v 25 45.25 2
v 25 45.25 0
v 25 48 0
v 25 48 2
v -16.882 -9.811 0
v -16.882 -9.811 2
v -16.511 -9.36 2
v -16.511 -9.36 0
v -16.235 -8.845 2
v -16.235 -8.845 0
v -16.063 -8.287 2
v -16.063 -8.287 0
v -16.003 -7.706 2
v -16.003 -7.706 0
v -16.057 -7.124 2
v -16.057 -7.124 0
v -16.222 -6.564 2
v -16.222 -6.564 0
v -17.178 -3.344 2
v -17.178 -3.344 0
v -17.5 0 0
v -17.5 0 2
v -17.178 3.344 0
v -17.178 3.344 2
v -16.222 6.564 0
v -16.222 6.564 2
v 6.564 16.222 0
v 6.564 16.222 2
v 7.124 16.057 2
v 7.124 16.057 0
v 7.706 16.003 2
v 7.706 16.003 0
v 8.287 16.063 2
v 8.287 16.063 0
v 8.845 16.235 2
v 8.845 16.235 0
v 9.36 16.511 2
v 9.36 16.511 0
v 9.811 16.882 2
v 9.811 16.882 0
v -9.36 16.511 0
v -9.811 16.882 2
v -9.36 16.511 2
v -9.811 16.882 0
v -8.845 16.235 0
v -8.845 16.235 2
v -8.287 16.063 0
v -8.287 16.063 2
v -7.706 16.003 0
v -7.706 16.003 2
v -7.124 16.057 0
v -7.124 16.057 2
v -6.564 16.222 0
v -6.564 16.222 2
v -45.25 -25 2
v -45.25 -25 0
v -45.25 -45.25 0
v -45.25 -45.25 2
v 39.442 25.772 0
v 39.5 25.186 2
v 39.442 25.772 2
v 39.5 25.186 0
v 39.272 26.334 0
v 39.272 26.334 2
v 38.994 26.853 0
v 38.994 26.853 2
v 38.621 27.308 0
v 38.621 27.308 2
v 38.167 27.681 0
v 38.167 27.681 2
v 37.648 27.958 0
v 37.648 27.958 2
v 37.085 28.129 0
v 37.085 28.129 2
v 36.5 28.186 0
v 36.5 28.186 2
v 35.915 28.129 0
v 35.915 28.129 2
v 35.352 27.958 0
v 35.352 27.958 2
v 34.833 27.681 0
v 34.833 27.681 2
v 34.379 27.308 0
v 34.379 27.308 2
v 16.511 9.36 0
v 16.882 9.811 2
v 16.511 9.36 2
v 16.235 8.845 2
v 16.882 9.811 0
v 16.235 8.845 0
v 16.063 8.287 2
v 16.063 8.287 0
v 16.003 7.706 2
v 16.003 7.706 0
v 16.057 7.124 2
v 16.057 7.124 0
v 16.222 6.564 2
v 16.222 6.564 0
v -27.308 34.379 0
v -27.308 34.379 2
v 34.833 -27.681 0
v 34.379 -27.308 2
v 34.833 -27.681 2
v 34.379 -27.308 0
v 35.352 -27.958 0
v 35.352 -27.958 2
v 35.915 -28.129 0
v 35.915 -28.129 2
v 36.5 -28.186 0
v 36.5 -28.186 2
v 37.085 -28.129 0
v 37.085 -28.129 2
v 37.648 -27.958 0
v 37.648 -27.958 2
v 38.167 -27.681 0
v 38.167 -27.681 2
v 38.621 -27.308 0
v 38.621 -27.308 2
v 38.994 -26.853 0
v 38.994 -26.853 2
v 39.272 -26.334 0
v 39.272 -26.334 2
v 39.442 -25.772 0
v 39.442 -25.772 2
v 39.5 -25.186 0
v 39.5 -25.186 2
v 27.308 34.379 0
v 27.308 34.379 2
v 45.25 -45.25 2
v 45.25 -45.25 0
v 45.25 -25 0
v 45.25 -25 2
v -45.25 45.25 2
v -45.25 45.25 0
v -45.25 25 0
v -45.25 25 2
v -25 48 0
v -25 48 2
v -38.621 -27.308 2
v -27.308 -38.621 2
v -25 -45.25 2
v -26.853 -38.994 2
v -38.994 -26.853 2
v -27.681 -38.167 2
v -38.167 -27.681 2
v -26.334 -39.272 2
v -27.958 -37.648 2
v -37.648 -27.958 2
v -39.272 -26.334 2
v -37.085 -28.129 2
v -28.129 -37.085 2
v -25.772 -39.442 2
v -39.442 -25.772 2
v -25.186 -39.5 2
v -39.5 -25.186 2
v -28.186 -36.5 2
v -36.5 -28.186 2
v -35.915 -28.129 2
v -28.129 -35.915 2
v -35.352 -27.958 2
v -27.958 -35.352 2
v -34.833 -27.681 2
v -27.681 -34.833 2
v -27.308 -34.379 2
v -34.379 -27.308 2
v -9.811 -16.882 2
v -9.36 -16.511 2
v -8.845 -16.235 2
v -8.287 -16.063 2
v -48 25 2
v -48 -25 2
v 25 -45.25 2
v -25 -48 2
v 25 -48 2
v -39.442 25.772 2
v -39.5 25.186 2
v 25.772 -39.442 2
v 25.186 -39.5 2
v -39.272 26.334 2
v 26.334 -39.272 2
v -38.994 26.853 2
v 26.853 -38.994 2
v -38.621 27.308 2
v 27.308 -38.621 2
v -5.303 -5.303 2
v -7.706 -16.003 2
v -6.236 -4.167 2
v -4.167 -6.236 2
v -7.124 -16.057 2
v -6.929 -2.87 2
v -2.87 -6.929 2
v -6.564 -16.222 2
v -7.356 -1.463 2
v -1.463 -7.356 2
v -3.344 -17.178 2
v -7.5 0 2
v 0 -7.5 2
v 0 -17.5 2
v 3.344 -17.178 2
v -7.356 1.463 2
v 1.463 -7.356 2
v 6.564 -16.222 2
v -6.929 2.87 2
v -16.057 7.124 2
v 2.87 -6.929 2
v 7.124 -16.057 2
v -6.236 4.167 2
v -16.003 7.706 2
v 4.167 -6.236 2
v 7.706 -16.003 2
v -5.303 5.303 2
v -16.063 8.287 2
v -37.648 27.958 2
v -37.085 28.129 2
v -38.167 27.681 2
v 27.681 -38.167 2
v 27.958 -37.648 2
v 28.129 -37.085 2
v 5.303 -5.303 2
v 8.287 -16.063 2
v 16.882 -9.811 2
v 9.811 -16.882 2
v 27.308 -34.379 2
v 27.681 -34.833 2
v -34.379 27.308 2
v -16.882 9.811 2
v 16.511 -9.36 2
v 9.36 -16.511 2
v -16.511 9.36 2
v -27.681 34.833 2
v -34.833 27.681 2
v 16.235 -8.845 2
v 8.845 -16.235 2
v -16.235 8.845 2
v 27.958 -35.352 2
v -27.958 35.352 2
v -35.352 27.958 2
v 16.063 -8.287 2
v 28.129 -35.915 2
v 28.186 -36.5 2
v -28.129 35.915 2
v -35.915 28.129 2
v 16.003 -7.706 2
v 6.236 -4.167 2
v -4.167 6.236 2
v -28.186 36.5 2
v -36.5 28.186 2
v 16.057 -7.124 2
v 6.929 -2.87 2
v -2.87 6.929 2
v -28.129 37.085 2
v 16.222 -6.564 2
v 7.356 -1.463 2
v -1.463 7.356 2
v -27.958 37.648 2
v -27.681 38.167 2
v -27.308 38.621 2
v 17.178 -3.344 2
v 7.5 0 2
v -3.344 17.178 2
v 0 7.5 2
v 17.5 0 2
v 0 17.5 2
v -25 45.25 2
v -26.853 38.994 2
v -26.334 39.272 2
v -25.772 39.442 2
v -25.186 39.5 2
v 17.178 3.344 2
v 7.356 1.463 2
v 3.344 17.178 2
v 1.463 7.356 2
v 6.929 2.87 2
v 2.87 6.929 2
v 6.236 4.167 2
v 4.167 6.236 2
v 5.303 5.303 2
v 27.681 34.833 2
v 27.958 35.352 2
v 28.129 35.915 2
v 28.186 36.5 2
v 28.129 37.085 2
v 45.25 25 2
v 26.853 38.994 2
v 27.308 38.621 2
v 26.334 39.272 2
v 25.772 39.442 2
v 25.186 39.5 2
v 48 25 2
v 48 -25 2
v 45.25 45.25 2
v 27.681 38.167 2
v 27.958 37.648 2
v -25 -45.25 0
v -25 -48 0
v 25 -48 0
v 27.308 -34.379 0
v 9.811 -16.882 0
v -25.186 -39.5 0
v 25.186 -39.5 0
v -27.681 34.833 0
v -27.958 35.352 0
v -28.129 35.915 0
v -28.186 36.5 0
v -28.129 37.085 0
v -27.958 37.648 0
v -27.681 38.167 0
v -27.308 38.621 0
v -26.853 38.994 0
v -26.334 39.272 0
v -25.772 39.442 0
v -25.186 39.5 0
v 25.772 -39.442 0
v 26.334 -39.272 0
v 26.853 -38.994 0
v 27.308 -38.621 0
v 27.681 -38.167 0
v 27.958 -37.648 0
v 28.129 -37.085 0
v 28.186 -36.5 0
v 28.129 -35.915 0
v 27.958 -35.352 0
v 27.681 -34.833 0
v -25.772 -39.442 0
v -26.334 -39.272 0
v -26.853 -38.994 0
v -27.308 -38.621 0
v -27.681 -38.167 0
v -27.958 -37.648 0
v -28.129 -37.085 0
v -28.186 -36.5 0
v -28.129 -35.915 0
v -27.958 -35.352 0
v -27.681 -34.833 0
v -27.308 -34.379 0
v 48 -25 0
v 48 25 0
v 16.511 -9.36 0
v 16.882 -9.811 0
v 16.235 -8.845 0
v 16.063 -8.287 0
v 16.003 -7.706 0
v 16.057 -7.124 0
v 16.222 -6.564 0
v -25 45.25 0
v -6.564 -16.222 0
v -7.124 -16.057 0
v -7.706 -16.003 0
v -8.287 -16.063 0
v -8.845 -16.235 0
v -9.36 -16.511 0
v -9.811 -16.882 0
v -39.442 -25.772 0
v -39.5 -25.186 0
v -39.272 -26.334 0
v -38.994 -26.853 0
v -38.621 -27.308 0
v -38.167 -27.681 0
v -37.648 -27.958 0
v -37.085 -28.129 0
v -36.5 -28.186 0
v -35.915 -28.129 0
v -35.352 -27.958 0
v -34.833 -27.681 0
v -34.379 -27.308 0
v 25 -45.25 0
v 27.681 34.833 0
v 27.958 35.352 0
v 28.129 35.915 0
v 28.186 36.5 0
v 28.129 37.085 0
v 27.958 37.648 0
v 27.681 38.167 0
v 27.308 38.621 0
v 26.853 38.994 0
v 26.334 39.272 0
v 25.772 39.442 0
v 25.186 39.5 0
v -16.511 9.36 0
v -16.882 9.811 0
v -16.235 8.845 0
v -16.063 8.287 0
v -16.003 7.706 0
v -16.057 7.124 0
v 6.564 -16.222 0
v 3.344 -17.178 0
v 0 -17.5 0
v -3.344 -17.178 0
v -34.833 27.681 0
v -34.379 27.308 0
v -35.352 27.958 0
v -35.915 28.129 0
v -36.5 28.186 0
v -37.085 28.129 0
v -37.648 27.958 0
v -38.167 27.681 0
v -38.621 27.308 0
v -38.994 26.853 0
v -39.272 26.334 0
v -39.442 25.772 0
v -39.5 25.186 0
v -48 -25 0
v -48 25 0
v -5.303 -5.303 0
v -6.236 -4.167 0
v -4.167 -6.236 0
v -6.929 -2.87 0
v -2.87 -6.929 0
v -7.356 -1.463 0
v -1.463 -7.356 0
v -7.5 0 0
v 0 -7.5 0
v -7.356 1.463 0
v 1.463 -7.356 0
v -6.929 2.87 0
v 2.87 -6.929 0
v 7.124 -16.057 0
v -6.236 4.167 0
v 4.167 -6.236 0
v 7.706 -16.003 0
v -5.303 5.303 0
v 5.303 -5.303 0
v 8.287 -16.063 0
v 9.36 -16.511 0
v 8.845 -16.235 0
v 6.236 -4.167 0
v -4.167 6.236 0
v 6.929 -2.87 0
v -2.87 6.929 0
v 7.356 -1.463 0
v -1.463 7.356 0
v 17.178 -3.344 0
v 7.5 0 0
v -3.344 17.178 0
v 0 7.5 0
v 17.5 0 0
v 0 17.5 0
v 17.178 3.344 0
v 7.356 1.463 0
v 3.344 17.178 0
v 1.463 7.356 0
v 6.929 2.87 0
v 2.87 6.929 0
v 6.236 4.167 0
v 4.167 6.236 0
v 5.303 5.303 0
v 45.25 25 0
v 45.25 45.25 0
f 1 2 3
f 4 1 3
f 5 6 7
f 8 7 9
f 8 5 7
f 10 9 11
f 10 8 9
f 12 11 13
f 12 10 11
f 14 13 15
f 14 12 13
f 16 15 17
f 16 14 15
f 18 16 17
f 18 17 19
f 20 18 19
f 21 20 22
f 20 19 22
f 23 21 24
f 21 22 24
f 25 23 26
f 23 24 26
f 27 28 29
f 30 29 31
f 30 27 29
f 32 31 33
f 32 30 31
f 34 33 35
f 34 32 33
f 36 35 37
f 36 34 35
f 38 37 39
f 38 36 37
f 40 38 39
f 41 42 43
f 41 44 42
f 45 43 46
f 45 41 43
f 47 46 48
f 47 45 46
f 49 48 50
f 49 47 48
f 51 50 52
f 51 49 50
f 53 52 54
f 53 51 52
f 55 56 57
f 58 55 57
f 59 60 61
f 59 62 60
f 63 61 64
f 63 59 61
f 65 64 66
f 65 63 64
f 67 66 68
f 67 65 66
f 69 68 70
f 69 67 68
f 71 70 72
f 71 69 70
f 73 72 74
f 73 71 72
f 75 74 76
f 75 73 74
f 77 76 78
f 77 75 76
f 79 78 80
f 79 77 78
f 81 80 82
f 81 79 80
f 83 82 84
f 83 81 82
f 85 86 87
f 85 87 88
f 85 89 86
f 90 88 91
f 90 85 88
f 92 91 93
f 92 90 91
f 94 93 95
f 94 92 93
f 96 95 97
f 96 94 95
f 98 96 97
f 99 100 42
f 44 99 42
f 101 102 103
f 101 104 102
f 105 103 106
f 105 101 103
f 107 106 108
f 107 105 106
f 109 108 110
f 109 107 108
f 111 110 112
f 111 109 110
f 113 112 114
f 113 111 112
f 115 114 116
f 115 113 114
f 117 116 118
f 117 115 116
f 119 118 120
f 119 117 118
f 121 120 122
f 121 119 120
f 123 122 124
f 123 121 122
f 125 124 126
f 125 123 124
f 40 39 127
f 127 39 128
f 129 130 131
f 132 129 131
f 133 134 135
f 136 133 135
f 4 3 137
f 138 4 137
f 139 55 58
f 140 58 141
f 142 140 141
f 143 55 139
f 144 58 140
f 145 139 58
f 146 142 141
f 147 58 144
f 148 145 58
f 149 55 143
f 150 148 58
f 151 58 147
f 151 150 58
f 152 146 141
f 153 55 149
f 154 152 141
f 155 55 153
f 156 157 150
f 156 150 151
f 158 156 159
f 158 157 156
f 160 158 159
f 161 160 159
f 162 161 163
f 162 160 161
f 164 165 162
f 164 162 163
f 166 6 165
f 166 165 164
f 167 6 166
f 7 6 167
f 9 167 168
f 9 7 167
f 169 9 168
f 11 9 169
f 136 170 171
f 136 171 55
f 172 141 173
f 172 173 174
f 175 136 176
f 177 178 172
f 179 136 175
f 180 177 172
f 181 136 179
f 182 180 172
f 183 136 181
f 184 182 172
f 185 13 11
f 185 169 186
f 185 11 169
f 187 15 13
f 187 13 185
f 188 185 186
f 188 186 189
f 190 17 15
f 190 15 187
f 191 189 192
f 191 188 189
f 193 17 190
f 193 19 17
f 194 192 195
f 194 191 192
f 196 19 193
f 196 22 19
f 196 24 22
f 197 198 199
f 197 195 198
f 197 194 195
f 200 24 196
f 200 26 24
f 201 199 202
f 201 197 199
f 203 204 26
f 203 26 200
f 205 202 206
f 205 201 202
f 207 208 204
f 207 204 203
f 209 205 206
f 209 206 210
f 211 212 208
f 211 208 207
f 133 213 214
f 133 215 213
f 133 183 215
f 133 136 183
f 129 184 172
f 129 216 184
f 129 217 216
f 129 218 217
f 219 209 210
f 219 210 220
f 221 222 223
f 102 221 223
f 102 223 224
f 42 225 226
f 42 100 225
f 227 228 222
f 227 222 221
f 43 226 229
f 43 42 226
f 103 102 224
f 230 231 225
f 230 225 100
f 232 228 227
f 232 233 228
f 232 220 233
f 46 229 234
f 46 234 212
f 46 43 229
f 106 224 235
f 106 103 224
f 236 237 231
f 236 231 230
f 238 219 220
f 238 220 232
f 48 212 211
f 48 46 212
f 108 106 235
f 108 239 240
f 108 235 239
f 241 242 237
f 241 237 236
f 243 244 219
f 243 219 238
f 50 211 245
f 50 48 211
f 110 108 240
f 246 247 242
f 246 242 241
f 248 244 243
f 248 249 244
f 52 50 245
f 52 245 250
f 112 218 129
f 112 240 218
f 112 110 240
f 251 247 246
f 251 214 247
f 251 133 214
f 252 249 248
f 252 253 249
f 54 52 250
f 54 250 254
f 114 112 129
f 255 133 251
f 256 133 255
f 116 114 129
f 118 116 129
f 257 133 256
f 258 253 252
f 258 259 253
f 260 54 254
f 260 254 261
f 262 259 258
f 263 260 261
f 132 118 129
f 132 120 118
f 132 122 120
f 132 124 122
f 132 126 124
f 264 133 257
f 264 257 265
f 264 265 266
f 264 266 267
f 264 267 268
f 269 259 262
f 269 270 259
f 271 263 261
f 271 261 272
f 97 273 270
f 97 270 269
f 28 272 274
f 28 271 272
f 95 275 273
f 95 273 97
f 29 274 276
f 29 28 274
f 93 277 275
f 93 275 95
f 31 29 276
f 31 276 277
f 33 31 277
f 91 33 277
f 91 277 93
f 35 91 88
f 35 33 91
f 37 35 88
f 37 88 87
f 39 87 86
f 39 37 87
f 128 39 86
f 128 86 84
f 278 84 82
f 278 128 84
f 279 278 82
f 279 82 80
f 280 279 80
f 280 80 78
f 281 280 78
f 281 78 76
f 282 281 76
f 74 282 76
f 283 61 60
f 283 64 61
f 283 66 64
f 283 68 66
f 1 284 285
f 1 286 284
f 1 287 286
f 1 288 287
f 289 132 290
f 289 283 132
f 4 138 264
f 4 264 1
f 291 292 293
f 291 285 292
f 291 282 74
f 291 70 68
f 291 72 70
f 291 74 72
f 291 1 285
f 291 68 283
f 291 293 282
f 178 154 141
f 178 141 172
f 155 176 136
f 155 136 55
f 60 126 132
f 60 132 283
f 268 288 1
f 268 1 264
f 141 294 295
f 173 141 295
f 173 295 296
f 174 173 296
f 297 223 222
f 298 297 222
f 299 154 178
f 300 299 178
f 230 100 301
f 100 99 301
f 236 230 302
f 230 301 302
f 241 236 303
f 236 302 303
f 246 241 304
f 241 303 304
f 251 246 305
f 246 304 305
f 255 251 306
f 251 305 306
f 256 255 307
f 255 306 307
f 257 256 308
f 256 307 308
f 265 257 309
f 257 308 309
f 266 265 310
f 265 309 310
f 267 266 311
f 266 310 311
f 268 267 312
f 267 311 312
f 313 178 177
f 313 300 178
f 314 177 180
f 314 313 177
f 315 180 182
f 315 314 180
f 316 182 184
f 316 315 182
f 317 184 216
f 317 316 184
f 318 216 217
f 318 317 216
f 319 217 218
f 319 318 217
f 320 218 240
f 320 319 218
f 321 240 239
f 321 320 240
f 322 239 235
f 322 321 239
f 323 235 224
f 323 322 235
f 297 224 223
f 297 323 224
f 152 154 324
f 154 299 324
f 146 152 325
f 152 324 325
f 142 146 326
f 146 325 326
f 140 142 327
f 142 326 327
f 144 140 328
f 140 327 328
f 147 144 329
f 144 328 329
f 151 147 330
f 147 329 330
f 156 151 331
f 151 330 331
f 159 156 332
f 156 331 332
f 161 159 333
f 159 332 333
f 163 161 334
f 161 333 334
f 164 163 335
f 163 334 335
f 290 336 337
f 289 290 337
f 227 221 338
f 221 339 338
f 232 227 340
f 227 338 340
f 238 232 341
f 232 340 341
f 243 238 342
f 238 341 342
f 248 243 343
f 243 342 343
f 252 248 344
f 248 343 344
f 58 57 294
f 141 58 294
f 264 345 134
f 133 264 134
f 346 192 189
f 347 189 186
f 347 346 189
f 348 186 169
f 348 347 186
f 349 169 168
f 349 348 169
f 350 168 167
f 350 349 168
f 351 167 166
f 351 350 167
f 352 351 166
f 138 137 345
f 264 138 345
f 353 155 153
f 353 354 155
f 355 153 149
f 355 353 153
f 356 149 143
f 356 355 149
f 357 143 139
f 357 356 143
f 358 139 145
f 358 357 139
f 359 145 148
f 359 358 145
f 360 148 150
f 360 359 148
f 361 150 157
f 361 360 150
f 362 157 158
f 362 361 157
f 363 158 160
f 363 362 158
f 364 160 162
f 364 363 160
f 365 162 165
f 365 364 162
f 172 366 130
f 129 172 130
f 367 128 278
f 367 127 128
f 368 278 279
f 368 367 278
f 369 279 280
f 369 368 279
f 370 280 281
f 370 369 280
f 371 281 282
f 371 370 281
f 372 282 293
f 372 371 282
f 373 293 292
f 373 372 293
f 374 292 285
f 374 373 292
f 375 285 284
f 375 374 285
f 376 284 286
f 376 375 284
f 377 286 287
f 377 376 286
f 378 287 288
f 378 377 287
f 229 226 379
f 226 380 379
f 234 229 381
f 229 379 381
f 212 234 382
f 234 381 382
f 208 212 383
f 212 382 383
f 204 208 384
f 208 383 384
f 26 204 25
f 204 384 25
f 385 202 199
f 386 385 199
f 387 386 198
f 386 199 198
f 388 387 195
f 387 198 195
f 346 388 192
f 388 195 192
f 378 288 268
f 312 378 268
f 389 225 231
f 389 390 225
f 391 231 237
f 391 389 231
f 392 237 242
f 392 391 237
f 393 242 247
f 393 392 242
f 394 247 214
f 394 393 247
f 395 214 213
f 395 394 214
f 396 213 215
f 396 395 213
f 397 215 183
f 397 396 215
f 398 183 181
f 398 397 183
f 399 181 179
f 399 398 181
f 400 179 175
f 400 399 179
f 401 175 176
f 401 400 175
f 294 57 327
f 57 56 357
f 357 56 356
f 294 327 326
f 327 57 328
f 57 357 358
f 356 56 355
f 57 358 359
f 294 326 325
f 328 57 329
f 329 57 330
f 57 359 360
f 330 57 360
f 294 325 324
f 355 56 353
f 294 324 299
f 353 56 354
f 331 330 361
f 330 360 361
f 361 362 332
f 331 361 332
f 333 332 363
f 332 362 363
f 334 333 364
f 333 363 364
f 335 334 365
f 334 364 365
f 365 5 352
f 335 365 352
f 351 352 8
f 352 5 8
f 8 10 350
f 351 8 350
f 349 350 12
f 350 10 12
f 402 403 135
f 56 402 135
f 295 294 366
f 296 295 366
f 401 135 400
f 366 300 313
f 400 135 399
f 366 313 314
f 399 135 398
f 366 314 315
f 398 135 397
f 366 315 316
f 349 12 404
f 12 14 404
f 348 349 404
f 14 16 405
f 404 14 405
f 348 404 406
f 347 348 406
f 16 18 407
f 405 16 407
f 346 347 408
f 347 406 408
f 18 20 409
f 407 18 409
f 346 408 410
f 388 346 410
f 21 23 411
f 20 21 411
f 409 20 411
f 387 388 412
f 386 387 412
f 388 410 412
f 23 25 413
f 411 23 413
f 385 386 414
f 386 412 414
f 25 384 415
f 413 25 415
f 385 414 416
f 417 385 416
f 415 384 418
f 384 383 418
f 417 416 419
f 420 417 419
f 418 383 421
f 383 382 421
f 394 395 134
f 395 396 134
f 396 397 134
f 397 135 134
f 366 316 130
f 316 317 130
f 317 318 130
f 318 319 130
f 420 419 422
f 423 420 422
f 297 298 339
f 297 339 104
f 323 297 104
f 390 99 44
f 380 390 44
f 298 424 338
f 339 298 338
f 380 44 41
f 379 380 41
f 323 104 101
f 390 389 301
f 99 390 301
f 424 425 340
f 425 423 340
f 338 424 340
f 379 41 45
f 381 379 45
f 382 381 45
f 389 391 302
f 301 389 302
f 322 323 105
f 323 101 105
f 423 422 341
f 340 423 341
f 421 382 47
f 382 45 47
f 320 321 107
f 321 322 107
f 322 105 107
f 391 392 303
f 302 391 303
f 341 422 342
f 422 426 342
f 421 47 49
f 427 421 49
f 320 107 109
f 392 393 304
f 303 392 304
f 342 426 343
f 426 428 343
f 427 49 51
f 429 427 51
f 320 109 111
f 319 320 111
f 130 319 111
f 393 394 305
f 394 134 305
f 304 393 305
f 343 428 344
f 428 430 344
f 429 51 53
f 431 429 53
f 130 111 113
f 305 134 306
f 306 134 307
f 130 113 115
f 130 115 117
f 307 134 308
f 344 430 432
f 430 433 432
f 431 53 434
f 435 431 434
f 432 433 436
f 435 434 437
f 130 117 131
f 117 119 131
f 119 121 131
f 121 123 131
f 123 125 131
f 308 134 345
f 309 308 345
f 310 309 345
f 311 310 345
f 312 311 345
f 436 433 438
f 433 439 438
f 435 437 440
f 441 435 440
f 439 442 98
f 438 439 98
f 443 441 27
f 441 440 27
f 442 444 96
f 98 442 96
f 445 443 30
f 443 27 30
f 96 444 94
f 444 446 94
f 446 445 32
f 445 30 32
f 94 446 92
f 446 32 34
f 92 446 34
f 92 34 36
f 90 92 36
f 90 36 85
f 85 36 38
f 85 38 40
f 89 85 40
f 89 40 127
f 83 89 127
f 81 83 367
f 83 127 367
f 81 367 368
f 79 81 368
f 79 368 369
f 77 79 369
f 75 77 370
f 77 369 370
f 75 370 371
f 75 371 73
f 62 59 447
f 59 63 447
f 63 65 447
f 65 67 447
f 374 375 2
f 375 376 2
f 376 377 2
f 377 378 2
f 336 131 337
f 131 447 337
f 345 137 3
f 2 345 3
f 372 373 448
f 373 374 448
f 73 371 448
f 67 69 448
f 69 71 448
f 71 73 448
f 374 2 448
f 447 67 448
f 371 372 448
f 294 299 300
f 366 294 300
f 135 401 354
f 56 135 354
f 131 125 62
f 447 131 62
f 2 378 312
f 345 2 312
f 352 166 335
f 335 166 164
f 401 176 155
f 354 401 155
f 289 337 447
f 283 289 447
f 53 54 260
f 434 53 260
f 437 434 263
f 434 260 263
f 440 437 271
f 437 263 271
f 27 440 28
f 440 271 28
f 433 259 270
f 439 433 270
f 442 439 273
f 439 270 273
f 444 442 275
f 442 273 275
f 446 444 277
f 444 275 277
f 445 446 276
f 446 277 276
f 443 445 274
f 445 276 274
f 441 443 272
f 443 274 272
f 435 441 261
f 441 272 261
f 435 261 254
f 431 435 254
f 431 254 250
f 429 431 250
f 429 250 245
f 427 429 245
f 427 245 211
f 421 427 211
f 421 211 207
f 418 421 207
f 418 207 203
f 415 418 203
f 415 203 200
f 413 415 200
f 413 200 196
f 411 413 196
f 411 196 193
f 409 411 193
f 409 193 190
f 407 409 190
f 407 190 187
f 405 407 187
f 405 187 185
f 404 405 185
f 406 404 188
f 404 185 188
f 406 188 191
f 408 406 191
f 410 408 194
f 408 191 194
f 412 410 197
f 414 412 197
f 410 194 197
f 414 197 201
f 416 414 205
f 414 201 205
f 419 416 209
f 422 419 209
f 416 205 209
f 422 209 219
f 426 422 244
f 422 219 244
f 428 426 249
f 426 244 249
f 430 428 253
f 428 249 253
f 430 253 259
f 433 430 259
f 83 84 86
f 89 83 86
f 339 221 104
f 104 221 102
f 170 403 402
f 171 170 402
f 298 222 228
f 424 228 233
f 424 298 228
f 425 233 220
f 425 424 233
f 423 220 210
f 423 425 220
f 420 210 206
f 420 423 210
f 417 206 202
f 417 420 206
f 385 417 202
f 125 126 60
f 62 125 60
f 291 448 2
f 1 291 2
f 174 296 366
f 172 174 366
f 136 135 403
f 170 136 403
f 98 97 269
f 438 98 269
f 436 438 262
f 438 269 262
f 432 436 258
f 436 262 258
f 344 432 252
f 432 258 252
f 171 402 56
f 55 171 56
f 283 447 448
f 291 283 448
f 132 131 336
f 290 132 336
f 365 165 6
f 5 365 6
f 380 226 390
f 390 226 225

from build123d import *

# Parameters (mm, degrees)
F1_DEPTH = 2
F2_R     = 7.5
F3_DEPTH = 25
F4_R     = 3


with BuildPart() as f1:
    # F0 (on Top) → F1 (new body)
    with BuildSketch(Plane.XY):
        Polygon((25, 45.25), (25, 48), (-25, 48), (-25, 45.25), (-45.25, 45.25), (-45.25, 25), (-48, 25), (-48, -25), (-45.25, -25), (-45.25, -45.25), (-25, -45.25), (-25, -48), (25, -48), (25, -45.25), (45.25, -45.25), (45.25, -25), (48, -25), (48, 25), (45.25, 25), (45.25, 45.25), align=None)
    extrude(amount=F1_DEPTH)

    # F2 (on face) → F3 (cut)
    with BuildSketch(Plane.XY.offset(2)):
        with BuildLine():
            ThreePointArc((-15.394075, -8.323007), (-17.5, 0), (-15.394075, 8.323007))
            Line((-15.394075, 8.323007), (-39.5, 32.428932))
            Line((-39.5, 32.428932), (-39.5, -32.428932))
            Line((-39.5, -32.428932), (-15.394075, -8.323007))
        make_face()
        with BuildLine():
            Line((-32.428932, 39.5), (-8.323007, 15.394075))
            ThreePointArc((-8.323007, 15.394075), (0, 17.5), (8.323007, 15.394075))
            Line((8.323007, 15.394075), (32.428932, 39.5))
            Line((32.428932, 39.5), (-32.428932, 39.5))
        make_face()
        Circle(F2_R)
        with BuildLine():
            ThreePointArc((15.394075, 8.323007), (17.5, 0), (15.394075, -8.323007))
            Line((15.394075, -8.323007), (39.5, -32.428932))
            Line((39.5, -32.428932), (39.5, 32.428932))
            Line((39.5, 32.428932), (15.394075, 8.323007))
        make_face()
        with BuildLine():
            Line((-32.428932, -39.5), (32.428932, -39.5))
            Line((32.428932, -39.5), (8.323007, -15.394075))
            ThreePointArc((8.323007, -15.394075), (0, -17.5), (-8.323007, -15.394075))
            Line((-8.323007, -15.394075), (-32.428932, -39.5))
        make_face()
    extrude(amount=-F3_DEPTH, mode=Mode.SUBTRACT)

    # F4
    f4_edges = [f1.edges().sort_by_distance(p)[0] for p in [
        (-39.5, 32.428932, 1),
        (-15.394075, -8.323007, 1),
        (-15.394075, 8.323007, 1),
        (8.323007, 15.394075, 1),
        (-8.323007, 15.394075, 1),
        (-32.428932, -39.5, 1),
        (15.394075, -8.323007, 1),
        (15.394075, 8.323007, 1),
        (39.5, -32.428932, 1),
        (39.5, 32.428932, 1),
        (32.428932, 39.5, 1),
        (32.428932, -39.5, 1),
        (-39.5, -32.428932, 1),
        (-32.428932, 39.5, 1),
        (-8.323007, -15.394075, 1),
        (8.323007, -15.394075, 1),
    ]]
    fillet(f4_edges, radius=F4_R)


solid = f1.part
